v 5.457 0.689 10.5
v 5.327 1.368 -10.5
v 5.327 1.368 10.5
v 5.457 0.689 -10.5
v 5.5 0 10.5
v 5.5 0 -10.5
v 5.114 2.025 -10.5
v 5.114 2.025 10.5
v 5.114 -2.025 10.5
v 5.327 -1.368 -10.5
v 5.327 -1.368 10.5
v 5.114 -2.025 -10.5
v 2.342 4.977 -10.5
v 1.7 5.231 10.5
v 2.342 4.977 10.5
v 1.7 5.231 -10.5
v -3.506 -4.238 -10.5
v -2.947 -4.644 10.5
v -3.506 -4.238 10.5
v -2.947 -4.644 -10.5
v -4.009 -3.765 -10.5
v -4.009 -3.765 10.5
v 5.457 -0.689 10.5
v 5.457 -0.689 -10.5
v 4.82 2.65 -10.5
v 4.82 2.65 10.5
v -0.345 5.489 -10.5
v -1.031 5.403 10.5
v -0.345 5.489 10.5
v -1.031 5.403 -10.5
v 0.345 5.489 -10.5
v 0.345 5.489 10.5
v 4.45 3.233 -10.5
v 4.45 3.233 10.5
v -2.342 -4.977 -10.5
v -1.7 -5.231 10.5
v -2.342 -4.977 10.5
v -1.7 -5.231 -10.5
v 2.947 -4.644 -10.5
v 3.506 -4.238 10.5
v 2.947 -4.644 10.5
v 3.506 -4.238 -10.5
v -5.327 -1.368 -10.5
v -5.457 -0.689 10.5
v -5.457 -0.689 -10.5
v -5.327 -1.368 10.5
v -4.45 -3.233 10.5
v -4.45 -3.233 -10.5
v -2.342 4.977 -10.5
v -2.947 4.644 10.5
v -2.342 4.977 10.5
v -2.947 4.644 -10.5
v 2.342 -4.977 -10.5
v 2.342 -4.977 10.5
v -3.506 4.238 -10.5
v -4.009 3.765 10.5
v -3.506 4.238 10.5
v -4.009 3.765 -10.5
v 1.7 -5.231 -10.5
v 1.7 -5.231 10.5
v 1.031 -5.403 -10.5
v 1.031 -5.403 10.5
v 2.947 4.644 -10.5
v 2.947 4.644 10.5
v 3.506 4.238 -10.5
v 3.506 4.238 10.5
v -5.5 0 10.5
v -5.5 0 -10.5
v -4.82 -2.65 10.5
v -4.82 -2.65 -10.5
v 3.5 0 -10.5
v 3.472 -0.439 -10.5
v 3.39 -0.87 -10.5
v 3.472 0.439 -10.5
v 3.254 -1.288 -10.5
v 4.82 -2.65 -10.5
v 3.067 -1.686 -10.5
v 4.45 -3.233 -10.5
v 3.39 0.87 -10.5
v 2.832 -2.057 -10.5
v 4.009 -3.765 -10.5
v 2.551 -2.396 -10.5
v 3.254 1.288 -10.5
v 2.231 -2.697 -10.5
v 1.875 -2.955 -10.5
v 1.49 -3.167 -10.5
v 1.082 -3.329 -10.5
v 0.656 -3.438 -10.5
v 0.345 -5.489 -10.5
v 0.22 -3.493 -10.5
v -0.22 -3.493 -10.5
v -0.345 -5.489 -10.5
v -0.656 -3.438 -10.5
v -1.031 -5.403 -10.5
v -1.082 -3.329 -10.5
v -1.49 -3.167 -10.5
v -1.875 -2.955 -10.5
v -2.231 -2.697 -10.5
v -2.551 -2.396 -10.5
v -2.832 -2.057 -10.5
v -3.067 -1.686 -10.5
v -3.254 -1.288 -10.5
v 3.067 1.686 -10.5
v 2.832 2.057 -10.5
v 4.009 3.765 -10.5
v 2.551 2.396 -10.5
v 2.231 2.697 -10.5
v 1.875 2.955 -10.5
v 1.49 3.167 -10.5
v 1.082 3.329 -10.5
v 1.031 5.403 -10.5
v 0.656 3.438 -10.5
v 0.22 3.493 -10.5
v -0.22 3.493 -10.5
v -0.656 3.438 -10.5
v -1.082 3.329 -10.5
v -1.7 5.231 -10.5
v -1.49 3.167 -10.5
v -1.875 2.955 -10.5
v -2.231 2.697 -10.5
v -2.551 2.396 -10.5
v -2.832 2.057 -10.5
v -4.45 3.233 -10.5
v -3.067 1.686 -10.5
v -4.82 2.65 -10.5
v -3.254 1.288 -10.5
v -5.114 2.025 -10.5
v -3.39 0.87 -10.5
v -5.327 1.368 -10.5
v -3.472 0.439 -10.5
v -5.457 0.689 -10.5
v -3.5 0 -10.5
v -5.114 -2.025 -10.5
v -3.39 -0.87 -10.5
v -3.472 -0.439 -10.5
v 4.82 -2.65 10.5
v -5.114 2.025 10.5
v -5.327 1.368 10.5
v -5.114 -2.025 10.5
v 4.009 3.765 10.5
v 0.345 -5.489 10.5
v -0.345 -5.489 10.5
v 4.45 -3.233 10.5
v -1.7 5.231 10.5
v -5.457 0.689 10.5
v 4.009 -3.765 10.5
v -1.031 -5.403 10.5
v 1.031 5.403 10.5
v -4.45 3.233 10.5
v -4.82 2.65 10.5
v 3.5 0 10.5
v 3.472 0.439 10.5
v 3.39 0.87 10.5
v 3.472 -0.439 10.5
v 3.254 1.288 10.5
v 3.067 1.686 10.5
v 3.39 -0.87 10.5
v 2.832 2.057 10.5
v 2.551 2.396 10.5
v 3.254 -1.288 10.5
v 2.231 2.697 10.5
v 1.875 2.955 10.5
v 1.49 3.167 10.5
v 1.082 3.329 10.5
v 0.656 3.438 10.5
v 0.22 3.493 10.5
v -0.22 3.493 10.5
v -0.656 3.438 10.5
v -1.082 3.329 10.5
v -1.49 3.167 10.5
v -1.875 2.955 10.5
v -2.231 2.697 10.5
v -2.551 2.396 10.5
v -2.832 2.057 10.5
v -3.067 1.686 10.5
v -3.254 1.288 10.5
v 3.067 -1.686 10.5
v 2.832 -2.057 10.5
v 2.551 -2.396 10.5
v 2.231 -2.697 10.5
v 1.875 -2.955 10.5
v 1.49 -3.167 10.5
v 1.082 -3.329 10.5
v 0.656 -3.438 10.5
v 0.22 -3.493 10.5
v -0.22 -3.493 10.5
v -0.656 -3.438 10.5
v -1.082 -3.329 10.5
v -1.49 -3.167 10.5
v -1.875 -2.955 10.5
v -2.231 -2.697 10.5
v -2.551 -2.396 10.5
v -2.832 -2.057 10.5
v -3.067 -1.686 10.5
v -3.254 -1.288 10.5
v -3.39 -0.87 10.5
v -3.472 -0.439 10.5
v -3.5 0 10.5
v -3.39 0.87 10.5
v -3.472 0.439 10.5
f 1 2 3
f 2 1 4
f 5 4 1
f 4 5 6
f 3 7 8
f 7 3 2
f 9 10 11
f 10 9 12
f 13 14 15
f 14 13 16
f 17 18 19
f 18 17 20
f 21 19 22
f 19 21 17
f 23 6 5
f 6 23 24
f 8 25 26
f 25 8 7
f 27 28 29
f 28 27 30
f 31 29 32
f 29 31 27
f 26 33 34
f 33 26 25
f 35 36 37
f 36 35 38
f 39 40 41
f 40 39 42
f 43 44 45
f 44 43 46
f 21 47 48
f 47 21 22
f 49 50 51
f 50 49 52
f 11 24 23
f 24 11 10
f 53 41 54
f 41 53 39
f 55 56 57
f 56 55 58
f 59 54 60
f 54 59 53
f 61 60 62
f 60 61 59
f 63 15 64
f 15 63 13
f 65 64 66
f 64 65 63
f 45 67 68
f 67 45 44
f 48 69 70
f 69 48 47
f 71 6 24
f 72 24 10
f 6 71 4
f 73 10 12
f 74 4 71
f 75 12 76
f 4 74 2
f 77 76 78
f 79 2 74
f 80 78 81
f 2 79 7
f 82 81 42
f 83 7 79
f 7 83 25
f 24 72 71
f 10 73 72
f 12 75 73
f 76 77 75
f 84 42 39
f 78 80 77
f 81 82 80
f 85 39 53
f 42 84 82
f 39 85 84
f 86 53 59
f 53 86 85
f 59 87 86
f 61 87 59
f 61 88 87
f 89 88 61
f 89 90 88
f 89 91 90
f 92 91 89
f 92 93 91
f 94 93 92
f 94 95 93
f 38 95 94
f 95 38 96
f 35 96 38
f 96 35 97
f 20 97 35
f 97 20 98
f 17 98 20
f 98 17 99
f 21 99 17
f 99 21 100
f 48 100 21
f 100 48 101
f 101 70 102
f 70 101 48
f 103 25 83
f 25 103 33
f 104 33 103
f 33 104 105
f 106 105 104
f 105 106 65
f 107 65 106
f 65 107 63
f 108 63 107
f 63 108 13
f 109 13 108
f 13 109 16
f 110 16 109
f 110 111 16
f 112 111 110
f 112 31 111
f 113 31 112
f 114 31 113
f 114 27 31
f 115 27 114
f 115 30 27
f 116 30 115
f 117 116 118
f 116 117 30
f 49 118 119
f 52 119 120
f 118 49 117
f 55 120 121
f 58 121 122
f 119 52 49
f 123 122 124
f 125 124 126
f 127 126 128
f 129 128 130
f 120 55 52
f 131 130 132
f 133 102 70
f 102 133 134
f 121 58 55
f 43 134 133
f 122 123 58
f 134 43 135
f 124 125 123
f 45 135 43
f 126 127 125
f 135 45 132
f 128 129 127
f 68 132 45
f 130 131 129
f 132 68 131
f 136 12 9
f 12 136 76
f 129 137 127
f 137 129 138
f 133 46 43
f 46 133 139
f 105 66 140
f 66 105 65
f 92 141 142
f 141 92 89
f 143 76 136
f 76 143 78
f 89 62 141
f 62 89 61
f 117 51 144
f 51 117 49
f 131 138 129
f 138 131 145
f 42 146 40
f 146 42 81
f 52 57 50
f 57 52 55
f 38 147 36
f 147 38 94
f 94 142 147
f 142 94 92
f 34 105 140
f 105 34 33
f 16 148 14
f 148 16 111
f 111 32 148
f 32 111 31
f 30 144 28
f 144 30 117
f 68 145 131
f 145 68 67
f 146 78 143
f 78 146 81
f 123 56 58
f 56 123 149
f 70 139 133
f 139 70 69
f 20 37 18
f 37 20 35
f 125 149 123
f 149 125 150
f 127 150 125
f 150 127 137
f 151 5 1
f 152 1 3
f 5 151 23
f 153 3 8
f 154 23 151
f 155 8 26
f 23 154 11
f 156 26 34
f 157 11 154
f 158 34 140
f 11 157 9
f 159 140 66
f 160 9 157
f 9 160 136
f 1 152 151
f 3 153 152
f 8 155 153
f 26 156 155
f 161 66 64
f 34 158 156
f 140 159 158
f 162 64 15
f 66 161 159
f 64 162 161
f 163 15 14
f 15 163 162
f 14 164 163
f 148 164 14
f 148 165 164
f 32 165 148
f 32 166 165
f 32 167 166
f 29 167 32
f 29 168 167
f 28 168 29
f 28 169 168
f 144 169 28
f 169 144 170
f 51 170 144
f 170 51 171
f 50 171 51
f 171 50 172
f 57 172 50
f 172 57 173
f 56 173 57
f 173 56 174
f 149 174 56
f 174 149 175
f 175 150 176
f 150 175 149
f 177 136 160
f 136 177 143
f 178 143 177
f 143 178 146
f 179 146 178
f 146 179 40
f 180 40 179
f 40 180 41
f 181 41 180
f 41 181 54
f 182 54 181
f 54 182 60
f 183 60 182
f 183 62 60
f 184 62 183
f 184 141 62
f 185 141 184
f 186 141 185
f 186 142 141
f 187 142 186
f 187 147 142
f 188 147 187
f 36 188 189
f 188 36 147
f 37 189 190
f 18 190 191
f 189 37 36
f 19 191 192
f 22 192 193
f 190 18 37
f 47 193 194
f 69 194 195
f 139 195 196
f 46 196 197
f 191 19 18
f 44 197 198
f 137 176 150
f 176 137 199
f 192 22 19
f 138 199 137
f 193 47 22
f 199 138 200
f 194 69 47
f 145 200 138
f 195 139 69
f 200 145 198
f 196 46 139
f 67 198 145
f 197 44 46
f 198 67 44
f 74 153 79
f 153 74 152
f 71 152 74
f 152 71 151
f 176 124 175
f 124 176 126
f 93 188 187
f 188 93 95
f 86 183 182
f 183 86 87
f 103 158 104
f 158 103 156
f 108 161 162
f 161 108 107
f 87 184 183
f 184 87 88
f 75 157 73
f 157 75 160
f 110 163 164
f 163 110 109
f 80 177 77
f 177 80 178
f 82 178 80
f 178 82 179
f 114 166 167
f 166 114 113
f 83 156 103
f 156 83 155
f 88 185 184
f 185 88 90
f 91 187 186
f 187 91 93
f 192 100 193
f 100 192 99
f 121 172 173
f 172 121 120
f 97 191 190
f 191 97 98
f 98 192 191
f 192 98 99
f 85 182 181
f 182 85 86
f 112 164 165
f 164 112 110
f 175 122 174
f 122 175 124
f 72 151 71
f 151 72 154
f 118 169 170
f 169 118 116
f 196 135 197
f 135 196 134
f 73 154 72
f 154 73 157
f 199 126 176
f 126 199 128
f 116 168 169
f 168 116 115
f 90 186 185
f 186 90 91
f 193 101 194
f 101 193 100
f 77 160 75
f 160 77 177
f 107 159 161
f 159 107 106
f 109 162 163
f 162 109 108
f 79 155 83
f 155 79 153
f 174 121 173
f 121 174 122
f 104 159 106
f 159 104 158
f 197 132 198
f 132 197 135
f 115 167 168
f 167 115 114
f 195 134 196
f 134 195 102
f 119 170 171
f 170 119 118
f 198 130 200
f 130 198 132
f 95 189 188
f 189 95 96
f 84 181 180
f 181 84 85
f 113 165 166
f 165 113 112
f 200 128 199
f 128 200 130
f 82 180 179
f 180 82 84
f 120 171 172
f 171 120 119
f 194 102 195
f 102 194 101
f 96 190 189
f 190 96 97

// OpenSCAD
$fn = 50;


difference() {
	union() {
		translate(v = [0, 0, -10.5000000000]) {
			cylinder(h = 21, r = 5.5000000000);
		}
	}
	union() {
		translate(v = [0, 0, -100.0000000000]) {
			cylinder(h = 200, r = 3.5000000000);
		}
	}
}
